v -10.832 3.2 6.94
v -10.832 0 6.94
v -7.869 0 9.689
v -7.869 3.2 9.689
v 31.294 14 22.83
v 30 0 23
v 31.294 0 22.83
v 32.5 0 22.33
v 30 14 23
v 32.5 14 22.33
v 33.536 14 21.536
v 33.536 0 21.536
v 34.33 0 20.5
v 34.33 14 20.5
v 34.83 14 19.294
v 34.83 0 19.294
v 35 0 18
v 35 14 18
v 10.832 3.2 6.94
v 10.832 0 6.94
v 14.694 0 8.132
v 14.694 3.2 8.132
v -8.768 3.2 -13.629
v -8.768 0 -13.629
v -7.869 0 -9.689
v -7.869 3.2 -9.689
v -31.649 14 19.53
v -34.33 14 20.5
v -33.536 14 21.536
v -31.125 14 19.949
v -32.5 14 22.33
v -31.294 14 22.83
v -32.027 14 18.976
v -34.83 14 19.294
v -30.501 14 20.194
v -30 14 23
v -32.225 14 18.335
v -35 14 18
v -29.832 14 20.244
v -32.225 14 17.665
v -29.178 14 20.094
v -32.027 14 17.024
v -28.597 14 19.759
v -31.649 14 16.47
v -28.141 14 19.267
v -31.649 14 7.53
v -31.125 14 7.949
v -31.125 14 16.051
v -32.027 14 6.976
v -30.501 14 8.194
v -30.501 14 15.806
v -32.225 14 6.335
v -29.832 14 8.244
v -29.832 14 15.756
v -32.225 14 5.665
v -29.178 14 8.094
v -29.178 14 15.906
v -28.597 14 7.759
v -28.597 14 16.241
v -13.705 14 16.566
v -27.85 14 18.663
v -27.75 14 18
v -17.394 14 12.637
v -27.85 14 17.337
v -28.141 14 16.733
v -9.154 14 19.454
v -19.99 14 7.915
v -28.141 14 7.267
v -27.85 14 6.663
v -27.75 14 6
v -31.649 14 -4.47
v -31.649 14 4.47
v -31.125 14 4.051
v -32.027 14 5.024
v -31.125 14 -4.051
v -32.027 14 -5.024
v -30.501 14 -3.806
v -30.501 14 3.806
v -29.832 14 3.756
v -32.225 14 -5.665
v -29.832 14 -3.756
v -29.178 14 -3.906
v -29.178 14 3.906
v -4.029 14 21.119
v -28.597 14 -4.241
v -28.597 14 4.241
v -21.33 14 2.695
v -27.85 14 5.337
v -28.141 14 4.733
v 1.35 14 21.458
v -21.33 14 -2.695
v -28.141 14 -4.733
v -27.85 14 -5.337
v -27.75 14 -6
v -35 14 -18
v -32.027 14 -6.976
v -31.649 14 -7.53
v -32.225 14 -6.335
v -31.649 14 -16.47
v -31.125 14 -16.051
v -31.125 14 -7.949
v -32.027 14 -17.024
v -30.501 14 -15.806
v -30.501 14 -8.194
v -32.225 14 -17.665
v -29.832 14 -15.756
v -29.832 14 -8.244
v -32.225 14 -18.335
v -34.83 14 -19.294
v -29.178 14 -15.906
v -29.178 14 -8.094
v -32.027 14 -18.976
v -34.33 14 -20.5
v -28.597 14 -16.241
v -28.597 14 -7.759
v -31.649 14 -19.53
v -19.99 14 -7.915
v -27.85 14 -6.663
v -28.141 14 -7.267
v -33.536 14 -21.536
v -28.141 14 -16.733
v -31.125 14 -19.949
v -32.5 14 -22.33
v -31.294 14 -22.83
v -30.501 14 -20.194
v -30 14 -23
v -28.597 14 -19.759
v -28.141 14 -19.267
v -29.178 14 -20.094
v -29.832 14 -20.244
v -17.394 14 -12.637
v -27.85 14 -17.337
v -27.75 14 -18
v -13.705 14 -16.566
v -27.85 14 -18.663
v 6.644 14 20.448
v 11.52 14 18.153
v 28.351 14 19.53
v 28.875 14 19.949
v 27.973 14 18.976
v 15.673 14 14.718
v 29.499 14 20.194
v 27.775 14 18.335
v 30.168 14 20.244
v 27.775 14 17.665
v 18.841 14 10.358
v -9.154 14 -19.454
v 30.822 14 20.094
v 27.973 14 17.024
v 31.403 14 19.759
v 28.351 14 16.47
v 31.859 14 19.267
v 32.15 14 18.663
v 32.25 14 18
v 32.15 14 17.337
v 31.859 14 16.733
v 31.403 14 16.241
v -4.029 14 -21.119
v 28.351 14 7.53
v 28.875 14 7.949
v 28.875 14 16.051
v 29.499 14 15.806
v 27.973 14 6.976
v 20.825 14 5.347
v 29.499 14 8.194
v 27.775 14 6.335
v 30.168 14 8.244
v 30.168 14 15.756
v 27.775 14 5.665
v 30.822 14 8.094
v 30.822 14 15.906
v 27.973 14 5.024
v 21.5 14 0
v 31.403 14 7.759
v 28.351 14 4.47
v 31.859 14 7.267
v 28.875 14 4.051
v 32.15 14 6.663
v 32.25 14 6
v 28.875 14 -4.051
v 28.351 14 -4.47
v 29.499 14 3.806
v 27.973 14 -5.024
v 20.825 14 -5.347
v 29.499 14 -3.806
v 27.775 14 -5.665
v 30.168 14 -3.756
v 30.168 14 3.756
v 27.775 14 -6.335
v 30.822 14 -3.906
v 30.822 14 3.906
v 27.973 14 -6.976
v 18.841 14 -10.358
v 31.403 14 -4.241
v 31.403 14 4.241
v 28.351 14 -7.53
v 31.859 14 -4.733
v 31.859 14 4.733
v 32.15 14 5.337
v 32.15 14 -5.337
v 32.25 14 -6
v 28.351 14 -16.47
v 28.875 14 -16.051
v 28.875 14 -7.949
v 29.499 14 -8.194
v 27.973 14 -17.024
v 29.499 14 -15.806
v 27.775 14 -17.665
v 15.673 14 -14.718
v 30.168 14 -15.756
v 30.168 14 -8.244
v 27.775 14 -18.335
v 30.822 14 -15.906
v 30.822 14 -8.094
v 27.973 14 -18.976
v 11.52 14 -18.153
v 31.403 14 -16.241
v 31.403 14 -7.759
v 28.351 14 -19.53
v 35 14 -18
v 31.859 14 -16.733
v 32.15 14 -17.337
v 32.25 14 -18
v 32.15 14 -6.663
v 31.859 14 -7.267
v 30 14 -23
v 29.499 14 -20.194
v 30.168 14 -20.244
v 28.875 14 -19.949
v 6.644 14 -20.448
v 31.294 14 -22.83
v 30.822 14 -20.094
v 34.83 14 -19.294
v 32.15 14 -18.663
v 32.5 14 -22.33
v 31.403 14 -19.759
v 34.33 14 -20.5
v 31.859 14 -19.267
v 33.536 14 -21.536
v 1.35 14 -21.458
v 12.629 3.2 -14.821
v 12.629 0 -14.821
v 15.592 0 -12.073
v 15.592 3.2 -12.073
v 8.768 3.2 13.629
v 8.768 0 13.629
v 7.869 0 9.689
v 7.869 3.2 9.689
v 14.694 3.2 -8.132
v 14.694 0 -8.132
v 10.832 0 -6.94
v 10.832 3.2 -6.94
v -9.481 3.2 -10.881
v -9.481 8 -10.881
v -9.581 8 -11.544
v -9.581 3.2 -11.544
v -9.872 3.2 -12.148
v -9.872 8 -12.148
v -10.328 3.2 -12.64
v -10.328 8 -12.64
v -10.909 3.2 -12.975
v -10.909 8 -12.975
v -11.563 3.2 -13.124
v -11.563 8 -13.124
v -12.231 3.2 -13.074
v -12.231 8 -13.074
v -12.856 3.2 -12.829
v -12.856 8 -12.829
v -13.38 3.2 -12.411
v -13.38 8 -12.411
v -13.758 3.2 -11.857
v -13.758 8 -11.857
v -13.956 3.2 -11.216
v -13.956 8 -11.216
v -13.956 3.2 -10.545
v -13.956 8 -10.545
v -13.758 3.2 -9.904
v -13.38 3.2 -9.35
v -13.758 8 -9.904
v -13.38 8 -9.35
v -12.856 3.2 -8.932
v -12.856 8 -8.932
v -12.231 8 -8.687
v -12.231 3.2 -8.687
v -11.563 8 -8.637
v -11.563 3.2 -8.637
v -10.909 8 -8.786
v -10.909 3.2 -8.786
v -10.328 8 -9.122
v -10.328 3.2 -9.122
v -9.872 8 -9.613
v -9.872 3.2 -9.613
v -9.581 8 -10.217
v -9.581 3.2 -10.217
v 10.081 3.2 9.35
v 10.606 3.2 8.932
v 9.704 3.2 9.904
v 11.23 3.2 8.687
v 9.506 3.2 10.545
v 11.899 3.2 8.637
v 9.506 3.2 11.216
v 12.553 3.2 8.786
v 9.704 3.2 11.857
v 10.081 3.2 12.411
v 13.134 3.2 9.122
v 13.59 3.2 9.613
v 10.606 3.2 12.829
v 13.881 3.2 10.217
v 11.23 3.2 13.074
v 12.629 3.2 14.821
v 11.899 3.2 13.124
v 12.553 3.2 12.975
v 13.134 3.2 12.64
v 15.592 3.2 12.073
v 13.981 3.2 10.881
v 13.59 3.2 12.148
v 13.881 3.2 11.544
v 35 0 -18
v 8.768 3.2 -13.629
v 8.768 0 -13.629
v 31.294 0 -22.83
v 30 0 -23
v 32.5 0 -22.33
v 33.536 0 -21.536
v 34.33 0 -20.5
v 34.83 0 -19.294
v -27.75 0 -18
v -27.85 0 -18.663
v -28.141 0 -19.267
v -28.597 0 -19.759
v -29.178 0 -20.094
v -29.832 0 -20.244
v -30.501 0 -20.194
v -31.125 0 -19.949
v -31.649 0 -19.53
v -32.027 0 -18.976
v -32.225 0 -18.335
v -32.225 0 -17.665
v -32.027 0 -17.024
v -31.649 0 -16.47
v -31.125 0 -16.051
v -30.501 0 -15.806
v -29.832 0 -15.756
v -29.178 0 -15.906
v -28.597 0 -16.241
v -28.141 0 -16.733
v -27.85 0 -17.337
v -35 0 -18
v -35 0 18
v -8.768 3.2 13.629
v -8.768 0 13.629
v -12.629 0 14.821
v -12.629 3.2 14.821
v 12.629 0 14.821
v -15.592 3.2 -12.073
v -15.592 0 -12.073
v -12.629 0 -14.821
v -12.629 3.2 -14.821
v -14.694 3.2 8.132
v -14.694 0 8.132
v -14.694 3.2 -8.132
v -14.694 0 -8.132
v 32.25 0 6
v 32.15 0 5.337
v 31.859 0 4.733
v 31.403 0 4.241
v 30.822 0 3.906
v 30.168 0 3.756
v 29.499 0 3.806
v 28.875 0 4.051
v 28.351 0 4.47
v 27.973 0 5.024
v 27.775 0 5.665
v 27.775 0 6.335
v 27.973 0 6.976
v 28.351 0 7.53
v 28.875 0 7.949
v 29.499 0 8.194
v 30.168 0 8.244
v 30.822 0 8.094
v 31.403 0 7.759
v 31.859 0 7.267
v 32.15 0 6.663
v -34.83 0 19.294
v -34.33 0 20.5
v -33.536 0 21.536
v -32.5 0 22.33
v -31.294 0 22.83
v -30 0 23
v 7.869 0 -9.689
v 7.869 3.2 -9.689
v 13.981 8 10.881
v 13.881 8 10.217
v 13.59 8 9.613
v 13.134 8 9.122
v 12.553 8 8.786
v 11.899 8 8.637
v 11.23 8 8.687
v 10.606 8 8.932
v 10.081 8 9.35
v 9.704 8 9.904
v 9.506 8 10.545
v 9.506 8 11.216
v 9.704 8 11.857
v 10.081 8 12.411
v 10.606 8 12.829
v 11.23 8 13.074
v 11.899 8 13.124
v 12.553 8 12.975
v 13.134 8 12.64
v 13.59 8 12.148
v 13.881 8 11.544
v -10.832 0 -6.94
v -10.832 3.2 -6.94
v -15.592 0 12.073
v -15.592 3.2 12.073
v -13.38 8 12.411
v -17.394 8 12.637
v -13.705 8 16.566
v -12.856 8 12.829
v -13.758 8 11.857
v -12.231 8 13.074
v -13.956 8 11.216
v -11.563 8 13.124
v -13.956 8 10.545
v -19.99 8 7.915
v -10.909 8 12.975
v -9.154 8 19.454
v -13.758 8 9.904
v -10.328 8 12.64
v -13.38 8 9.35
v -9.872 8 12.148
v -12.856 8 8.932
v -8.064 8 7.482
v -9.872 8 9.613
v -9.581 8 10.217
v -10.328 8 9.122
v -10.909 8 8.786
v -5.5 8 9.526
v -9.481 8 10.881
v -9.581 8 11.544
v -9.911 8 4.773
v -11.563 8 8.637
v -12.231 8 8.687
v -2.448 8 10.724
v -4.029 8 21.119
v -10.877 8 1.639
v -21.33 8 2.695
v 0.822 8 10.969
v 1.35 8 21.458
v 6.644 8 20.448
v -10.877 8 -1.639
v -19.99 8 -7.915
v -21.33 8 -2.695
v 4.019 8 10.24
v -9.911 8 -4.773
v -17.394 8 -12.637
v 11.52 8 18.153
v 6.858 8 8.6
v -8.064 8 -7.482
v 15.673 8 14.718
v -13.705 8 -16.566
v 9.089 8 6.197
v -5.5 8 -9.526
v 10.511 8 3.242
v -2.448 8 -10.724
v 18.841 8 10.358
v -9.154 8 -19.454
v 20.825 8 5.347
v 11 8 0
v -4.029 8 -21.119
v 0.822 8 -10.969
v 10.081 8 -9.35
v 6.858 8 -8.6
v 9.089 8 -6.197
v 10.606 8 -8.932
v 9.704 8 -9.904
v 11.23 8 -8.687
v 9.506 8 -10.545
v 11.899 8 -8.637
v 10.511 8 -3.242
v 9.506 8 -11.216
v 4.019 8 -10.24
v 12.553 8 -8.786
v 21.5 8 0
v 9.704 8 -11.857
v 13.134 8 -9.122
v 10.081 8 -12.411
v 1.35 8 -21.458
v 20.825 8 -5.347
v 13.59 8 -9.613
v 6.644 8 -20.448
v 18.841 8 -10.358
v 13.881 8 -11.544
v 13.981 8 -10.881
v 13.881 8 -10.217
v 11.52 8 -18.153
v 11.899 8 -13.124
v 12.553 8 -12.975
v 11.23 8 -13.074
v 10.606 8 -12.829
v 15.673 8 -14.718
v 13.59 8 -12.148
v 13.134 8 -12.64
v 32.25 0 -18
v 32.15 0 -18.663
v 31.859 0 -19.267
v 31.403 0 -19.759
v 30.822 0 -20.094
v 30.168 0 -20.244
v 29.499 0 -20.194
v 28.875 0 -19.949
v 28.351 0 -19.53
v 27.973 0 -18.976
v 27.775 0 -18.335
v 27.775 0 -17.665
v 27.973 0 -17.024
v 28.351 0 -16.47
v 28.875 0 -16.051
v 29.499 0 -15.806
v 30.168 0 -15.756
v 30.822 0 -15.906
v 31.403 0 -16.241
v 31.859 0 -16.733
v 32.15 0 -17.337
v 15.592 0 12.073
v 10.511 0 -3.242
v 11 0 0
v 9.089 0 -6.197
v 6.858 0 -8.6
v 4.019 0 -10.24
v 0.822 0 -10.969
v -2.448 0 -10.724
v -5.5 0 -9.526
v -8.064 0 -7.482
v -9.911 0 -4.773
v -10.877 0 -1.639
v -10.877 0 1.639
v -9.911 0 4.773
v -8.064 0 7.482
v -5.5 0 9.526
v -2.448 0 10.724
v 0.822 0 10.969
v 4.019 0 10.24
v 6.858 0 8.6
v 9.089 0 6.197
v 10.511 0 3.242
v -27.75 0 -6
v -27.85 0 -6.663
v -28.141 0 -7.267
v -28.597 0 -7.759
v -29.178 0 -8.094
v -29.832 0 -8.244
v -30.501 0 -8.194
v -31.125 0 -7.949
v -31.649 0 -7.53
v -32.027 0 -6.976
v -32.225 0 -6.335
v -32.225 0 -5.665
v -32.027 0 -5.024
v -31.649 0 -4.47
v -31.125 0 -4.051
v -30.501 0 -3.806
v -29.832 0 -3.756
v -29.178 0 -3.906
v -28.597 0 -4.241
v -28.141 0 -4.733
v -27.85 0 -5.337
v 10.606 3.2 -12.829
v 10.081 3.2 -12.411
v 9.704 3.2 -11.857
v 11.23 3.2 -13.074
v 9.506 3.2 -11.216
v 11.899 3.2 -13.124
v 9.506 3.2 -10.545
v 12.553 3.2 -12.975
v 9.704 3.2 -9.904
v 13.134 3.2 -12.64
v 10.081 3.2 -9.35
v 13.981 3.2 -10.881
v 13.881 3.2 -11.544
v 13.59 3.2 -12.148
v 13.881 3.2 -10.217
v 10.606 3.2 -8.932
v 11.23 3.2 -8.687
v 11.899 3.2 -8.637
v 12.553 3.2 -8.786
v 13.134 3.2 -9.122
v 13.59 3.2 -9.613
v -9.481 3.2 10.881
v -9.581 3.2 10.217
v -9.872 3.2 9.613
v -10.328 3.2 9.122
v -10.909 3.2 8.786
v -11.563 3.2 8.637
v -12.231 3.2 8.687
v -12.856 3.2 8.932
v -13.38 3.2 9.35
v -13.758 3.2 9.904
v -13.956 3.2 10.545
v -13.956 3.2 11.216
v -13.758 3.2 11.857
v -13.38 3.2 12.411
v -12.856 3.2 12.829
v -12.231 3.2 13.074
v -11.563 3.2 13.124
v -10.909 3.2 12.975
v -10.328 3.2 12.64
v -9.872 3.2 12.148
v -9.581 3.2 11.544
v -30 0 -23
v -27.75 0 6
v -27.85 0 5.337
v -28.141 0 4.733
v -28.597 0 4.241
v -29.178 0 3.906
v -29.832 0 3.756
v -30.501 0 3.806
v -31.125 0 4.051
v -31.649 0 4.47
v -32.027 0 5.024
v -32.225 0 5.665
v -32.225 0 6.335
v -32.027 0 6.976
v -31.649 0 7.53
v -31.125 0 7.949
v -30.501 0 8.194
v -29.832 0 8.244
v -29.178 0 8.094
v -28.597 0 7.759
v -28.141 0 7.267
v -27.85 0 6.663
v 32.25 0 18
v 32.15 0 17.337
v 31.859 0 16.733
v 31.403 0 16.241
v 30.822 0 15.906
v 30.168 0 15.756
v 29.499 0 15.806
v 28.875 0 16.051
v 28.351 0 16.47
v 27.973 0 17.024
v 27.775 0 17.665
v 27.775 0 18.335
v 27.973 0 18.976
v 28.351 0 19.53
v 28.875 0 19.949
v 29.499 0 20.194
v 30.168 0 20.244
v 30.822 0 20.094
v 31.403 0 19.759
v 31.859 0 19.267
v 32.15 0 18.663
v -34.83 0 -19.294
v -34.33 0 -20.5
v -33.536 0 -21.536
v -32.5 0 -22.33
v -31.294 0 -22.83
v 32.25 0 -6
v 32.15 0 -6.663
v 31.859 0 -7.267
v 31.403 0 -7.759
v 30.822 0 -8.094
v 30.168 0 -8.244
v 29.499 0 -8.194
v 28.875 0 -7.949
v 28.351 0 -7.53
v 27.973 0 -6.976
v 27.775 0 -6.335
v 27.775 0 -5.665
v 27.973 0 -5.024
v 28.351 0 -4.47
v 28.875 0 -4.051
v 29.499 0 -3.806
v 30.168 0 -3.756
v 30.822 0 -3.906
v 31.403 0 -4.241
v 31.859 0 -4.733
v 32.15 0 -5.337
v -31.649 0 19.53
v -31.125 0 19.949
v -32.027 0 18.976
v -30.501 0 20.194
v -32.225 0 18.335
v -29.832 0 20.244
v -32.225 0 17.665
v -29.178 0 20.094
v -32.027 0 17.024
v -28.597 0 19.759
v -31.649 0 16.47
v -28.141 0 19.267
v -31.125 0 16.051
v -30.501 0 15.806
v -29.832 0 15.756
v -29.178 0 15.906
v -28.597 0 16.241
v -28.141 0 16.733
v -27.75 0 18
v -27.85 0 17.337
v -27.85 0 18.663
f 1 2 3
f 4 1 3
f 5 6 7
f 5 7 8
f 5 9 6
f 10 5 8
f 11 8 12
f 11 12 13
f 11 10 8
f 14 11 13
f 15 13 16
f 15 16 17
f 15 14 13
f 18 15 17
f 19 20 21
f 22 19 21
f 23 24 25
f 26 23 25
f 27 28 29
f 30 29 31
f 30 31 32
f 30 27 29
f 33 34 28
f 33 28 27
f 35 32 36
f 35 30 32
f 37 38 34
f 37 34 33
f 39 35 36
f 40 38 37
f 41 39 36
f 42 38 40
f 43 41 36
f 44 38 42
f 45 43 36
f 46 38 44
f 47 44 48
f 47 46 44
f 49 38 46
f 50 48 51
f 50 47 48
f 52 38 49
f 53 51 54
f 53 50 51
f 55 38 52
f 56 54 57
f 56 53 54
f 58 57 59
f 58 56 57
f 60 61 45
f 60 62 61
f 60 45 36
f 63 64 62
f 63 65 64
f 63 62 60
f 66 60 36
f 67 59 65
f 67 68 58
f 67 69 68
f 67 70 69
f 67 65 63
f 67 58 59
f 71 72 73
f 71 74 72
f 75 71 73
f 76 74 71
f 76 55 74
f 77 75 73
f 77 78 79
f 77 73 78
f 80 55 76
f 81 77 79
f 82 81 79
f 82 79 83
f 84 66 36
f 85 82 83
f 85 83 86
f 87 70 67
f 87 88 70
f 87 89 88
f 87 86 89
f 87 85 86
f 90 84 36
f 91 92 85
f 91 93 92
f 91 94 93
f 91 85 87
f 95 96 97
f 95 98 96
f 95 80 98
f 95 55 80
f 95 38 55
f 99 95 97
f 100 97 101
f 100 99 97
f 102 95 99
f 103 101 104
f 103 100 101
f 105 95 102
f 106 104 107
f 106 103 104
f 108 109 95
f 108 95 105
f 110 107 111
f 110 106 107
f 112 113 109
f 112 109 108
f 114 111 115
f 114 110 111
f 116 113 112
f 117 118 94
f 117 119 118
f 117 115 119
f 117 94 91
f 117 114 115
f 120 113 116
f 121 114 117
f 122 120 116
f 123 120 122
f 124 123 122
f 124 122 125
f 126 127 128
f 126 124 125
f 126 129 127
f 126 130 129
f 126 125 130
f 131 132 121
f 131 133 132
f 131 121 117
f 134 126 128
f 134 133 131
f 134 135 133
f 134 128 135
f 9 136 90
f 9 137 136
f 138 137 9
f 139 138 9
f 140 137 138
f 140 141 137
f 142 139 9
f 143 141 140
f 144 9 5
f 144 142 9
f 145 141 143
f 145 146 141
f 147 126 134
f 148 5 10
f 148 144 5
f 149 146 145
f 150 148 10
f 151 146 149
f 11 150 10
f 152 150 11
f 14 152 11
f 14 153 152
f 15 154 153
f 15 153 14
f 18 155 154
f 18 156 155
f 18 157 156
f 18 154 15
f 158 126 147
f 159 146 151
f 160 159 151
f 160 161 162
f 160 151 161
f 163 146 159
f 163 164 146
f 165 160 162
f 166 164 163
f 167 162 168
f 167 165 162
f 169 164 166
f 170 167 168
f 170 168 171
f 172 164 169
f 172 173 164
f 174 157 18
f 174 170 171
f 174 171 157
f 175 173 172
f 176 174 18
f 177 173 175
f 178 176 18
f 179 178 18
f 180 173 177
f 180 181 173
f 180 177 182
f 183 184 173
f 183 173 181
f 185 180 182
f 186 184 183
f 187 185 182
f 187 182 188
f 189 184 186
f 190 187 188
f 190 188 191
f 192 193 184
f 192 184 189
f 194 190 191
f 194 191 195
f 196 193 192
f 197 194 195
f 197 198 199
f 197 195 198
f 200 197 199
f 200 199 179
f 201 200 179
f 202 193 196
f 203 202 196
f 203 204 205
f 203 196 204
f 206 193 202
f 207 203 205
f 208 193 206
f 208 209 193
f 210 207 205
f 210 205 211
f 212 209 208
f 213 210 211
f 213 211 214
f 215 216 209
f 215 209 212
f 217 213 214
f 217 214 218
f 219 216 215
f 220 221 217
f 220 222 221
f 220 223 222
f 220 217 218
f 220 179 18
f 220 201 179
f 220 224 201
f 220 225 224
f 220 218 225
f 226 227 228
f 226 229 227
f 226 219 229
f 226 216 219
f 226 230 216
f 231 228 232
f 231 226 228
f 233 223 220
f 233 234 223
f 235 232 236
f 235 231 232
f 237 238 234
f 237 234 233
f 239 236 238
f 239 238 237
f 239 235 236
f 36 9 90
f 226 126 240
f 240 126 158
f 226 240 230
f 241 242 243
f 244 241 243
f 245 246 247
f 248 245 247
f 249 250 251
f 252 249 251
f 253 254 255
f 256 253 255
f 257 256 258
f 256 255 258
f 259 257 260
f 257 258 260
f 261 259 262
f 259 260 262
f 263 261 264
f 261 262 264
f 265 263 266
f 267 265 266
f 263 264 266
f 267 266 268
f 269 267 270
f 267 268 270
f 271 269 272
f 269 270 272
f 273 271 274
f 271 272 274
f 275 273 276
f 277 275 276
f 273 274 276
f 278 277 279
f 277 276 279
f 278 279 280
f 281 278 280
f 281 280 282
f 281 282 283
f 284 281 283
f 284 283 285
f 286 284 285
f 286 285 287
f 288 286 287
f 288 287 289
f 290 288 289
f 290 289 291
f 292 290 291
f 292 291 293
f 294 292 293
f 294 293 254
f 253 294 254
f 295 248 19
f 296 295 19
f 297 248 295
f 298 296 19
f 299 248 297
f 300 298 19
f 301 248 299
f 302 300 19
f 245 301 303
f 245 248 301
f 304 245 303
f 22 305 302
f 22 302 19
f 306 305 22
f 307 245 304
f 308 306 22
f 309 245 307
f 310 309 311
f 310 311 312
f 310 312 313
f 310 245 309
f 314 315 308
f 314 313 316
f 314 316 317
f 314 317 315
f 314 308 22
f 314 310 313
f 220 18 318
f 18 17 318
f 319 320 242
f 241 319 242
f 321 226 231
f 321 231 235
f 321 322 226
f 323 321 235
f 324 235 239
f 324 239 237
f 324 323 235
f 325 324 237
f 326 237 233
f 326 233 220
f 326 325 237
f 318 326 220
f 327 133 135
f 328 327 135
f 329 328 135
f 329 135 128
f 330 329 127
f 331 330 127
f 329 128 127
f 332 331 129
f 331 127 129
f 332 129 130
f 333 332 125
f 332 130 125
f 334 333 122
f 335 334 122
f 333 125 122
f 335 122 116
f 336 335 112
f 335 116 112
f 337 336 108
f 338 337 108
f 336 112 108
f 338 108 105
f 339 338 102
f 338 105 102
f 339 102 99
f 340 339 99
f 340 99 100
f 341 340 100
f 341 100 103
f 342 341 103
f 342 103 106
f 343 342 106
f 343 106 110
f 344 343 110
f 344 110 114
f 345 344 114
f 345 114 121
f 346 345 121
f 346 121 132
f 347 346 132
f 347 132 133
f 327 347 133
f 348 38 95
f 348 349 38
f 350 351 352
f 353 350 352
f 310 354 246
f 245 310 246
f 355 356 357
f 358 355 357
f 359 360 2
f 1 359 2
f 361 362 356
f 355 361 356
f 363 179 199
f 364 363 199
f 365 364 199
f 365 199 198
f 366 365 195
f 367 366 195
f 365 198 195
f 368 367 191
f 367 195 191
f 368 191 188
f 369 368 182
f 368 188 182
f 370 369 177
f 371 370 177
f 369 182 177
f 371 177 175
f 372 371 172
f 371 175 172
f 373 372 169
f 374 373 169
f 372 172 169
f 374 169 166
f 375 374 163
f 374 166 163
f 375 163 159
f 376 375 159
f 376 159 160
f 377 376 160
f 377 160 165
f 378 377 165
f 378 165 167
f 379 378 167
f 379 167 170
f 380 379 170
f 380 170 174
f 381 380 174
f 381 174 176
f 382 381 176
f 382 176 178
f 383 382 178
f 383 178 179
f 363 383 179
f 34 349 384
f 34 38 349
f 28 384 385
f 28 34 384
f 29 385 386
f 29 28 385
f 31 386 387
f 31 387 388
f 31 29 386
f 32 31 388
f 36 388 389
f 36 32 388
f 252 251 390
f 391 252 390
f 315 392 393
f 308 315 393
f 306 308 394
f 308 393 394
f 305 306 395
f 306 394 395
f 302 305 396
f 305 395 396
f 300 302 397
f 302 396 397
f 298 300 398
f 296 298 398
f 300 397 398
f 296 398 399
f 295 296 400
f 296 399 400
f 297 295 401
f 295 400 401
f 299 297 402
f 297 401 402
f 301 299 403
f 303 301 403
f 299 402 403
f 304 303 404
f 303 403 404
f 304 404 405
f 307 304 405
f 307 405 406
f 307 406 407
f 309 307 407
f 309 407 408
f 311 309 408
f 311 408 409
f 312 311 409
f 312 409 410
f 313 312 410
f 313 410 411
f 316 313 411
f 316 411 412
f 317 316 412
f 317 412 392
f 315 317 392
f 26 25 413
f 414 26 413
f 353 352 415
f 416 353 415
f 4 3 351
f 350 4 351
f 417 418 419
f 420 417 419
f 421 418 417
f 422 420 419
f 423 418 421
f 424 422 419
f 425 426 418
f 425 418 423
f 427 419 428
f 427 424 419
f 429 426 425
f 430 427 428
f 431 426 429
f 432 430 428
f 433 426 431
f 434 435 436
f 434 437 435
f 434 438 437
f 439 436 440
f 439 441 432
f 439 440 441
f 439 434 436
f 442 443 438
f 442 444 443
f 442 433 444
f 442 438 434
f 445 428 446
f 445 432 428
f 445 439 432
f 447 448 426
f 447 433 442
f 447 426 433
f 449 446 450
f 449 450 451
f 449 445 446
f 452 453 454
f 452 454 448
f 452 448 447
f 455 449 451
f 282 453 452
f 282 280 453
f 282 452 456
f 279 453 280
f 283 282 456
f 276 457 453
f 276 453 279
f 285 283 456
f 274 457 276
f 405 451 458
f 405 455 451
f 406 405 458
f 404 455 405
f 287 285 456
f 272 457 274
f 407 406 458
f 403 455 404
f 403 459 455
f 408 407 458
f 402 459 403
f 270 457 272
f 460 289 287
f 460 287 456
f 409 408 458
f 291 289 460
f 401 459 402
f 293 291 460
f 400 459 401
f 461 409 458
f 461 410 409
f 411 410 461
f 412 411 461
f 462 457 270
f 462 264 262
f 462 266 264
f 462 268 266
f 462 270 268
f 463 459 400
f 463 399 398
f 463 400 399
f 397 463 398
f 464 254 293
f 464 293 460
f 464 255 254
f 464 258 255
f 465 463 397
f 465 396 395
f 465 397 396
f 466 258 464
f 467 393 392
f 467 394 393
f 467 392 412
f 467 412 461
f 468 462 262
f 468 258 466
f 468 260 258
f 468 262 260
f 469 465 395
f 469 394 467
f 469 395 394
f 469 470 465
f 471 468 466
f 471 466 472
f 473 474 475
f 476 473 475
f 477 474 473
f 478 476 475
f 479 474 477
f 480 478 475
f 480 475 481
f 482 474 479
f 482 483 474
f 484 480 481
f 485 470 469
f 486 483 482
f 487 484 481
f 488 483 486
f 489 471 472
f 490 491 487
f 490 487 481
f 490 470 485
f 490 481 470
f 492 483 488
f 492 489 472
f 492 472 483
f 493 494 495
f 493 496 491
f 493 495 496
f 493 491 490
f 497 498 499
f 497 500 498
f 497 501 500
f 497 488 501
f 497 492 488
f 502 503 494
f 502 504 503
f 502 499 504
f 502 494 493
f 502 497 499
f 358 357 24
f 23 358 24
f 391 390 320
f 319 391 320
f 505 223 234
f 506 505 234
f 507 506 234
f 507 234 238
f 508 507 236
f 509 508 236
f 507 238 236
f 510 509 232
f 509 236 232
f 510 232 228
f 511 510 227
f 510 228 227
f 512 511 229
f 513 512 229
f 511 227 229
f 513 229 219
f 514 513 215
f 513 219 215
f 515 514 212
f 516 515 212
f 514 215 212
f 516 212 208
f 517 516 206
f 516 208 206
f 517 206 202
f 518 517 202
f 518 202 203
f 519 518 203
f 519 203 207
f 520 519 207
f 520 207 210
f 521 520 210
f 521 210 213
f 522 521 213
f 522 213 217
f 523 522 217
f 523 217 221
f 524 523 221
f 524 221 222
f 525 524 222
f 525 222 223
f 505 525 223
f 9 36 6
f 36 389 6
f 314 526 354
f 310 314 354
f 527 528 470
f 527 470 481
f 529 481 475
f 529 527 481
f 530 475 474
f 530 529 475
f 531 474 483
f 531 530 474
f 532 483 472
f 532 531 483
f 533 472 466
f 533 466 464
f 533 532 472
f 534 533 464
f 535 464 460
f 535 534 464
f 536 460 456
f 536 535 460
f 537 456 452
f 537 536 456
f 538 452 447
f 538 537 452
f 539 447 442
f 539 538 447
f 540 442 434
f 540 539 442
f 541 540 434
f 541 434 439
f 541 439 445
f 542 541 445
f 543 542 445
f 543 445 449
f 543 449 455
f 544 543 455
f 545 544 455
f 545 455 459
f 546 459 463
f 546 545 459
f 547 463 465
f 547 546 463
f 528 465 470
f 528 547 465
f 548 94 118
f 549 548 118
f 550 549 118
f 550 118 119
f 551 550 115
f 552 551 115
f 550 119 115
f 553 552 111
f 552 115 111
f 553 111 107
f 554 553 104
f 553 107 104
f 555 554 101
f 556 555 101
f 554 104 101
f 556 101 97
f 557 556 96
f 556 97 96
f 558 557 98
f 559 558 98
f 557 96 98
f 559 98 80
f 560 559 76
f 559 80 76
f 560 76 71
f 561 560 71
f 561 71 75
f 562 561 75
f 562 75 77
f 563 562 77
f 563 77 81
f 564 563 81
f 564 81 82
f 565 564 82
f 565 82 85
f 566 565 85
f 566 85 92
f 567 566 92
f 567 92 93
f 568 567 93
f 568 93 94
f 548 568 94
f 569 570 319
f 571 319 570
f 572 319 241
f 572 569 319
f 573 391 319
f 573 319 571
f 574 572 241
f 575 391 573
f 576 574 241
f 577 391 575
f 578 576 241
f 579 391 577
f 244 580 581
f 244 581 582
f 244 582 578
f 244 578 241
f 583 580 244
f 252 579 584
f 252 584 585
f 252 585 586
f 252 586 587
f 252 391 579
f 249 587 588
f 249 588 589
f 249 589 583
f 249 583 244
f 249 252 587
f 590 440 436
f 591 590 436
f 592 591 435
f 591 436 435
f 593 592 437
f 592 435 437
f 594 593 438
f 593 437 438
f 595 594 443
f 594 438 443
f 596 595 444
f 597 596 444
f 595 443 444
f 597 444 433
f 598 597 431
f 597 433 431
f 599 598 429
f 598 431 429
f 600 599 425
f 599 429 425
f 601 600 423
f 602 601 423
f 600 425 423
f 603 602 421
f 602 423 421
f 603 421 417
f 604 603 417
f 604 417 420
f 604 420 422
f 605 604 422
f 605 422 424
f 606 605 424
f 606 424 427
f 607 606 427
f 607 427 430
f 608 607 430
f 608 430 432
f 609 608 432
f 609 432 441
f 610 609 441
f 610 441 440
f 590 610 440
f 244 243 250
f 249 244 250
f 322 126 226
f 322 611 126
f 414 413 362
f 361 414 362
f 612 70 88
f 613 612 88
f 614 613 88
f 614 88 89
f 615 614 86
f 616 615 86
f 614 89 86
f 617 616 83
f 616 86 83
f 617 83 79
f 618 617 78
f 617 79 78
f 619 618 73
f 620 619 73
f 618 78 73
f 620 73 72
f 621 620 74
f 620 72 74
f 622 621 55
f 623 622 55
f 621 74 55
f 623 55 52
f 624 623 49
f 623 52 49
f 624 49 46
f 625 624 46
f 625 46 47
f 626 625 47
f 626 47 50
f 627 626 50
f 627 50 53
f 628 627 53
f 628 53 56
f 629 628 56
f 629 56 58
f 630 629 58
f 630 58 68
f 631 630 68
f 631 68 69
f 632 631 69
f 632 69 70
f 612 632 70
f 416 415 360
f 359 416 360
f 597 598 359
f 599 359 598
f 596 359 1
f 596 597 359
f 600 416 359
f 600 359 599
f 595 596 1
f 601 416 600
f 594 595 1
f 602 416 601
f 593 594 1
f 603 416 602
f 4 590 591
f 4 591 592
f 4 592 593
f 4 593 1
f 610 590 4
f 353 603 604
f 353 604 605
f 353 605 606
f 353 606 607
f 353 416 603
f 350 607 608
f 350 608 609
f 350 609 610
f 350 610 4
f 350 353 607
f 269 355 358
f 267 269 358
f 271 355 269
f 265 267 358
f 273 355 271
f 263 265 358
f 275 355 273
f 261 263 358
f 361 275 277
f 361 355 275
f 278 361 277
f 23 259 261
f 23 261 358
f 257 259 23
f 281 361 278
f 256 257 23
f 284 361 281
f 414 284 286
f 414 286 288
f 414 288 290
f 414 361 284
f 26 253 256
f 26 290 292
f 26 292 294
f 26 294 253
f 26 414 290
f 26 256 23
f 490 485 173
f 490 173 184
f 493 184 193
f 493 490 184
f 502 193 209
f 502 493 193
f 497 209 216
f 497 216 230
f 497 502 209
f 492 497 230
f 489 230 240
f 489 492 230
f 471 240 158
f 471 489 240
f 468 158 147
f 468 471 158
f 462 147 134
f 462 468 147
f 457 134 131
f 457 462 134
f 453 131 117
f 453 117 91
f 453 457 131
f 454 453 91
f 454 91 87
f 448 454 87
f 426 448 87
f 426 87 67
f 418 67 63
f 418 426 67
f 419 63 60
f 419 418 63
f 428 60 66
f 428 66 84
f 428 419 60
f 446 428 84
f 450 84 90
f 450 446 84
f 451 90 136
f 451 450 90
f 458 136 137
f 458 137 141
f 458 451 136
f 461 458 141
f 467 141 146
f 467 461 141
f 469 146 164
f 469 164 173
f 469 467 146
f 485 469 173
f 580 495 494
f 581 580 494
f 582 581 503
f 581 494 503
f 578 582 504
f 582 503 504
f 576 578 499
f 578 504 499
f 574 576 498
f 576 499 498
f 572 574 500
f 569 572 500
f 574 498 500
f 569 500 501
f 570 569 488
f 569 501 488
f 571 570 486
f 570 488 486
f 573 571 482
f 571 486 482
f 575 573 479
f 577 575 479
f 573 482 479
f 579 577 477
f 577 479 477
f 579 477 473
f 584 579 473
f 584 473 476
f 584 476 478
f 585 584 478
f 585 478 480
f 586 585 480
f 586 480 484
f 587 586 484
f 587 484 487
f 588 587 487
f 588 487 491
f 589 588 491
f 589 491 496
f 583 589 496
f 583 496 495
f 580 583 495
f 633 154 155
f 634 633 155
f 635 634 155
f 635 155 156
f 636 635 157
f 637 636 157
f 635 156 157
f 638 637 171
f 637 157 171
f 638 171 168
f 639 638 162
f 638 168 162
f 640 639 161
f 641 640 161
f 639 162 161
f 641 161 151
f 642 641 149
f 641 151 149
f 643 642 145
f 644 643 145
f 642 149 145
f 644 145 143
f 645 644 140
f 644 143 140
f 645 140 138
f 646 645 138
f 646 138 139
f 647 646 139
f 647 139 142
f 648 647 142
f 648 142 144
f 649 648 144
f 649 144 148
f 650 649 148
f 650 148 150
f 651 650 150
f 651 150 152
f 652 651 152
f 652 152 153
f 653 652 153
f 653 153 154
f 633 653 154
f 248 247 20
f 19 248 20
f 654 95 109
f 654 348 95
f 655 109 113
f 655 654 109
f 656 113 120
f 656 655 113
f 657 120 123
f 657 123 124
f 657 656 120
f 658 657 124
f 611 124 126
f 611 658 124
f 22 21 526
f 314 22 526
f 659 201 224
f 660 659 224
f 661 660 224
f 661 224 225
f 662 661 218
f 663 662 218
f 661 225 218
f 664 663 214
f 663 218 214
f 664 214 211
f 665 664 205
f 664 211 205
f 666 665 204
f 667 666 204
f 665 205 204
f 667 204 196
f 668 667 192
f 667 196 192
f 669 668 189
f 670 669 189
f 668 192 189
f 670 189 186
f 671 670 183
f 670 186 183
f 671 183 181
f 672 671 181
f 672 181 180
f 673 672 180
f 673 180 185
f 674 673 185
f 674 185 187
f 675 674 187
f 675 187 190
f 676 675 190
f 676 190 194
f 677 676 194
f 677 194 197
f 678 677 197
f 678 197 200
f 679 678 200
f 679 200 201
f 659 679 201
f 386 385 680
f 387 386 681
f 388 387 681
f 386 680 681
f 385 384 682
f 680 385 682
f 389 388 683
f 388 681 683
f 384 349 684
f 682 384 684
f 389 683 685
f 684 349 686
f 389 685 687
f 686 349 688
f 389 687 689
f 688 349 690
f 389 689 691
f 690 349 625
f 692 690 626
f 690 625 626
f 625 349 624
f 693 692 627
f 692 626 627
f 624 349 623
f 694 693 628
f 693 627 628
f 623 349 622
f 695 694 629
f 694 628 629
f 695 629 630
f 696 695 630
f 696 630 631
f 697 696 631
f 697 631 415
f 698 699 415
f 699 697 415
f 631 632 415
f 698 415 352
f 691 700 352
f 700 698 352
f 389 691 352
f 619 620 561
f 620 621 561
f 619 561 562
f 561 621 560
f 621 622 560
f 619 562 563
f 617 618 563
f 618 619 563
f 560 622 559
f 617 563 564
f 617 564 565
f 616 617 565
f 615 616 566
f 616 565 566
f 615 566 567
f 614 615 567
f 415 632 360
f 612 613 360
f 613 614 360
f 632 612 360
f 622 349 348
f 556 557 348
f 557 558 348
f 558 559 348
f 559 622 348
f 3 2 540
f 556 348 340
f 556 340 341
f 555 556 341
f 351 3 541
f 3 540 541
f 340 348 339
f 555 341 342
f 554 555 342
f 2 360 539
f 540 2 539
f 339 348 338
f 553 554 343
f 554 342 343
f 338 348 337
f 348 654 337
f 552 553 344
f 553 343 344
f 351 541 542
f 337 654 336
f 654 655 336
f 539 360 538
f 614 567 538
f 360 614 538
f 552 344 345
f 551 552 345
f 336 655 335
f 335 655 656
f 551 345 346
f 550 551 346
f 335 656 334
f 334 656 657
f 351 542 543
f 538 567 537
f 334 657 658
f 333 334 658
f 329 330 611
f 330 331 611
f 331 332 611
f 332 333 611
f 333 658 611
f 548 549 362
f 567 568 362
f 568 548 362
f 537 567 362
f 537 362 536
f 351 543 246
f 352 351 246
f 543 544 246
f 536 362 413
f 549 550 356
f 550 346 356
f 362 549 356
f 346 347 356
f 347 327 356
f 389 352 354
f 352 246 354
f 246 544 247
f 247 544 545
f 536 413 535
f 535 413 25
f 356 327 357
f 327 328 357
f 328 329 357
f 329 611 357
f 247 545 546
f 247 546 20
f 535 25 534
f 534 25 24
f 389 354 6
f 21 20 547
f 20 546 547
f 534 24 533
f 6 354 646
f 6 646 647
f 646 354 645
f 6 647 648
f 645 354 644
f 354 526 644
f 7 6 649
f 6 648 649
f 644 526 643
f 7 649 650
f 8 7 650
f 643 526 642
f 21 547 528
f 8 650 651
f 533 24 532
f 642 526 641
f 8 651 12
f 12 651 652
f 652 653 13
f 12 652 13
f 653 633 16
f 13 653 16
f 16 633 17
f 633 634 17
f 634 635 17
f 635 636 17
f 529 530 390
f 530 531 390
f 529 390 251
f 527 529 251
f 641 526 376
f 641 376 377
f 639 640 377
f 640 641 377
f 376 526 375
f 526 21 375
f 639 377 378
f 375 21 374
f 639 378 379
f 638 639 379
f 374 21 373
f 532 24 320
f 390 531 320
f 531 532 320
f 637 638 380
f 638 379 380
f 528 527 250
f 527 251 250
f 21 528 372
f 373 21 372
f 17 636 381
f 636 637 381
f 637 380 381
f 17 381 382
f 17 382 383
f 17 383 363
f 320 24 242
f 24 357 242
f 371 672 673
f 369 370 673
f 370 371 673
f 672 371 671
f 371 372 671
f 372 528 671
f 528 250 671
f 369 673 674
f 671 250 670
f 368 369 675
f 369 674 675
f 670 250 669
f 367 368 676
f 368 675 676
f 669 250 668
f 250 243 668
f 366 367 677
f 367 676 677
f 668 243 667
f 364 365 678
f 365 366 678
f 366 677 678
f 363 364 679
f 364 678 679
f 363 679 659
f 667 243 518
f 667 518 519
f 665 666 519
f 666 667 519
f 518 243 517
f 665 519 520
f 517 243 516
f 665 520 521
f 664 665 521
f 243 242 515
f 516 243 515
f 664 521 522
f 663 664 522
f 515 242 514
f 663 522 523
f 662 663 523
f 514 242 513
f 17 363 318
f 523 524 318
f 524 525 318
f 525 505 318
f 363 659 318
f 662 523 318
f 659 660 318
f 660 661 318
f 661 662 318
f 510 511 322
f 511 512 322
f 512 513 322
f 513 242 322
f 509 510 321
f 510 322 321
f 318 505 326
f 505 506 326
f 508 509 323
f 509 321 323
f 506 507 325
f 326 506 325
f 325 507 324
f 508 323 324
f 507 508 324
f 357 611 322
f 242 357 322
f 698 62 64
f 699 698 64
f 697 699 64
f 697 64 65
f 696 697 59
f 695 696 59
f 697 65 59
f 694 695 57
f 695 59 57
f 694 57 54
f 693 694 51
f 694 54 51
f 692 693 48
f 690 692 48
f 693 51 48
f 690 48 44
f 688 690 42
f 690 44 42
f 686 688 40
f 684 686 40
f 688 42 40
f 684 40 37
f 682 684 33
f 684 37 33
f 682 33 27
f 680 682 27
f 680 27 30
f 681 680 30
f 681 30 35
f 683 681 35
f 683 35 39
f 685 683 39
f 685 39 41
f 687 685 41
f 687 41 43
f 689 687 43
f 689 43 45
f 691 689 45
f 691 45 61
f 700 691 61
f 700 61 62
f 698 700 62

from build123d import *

# Parameters (mm, degrees)
SKETCH1_W           = 70
SKETCH1_H           = 46
SKETCH1_R           = 11
BOSS_EXTRUDE1_DEPTH = 8
SKETCH2_W           = 70
SKETCH2_H           = 46
SKETCH2_R           = 21.5
BOSS_EXTRUDE2_DEPTH = 6
SKETCH3_R           = 2.25
CUT_EXTRUDE1_DEPTH  = 9
CUT_EXTRUDE2_DEPTH  = 3.2
FILLET1_R           = 5
SKETCH6_R           = 2.25
CUT_EXTRUDE3_DEPTH  = 15


with BuildPart() as part:
    # Sketch1 → Boss-Extrude1 (new body)
    with BuildSketch(Plane(origin=(0, 0, 0), x_dir=(1, 0, 0), z_dir=(0, 1, 0))):
        Rectangle(SKETCH1_W, SKETCH1_H)
        Circle(SKETCH1_R, mode=Mode.SUBTRACT)
    extrude(amount=BOSS_EXTRUDE1_DEPTH)

    # Sketch2 → Boss-Extrude2 (add)
    with BuildSketch(Plane(origin=(0, 8, 0), x_dir=(1, 0, 0), z_dir=(0, 1, 0))):
        Rectangle(SKETCH2_W, SKETCH2_H)
        Circle(SKETCH2_R, mode=Mode.SUBTRACT)
    extrude(amount=BOSS_EXTRUDE2_DEPTH)

    # Sketch3 → Cut-Extrude1 (cut, through all)
    with BuildSketch(Plane(origin=(0, 8, 0), x_dir=(1, 0, 0), z_dir=(0, 1, 0))):
        with Locations((-11.730749234, 10.880694942)):
            Circle(SKETCH3_R)
        with Locations((11.730749234, 10.880694942)):
            Circle(SKETCH3_R)
        with Locations((11.730749234, -10.880694942)):
            Circle(SKETCH3_R)
        with Locations((-11.730749234, -10.880694942)):
            Circle(SKETCH3_R)
    extrude(amount=-CUT_EXTRUDE1_DEPTH, mode=Mode.SUBTRACT)

    # Sketch5 → Cut-Extrude2 (cut)
    with BuildSketch(Plane.XZ):
        Polygon((-12.629361921, 14.820977745), (-15.592440583, 12.072614928), (-14.693827896, 8.132332124), (-10.832136547, 6.940412138), (-7.869057884, 9.688774955), (-8.767670572, 13.629057759), align=None)
        Polygon((-10.832136547, -6.940412138), (-14.693827896, -8.132332124), (-15.592440583, -12.072614928), (-12.629361921, -14.820977745), (-8.767670572, -13.629057759), (-7.869057884, -9.688774955), align=None)
        Polygon((10.832136547, -6.940412138), (7.869057884, -9.688774955), (8.767670572, -13.629057759), (12.629361921, -14.820977745), (15.592440583, -12.072614928), (14.693827896, -8.132332124), align=None)
        Polygon((7.869057884, 9.688774955), (10.832136547, 6.940412138), (14.693827896, 8.132332124), (15.592440583, 12.072614928), (12.629361921, 14.820977745), (8.767670572, 13.629057759), align=None)
    extrude(amount=-CUT_EXTRUDE2_DEPTH, mode=Mode.SUBTRACT)

    # Fillet1
    fillet1_edges = [part.edges().sort_by_distance(p)[0] for p in [
        (35, 7, 23),
        (-35, 7, 23),
        (-35, 7, -23),
        (35, 7, -23),
    ]]
    fillet(fillet1_edges, radius=FILLET1_R)

    # Sketch6 → Cut-Extrude3 (cut, through all)
    with BuildSketch(Plane(origin=(0, 14, 0), x_dir=(1, 0, 0), z_dir=(0, 1, 0))):
        with Locations((-30, 18)):
            Circle(SKETCH6_R)
        with Locations((-30, -18)):
            Circle(SKETCH6_R)
        with Locations((30, -18)):
            Circle(SKETCH6_R)
        with Locations((30, 18)):
            Circle(SKETCH6_R)
        with Locations((-30, 6)):
            Circle(SKETCH6_R)
        with Locations((-30, -6)):
            Circle(SKETCH6_R)
        with Locations((30, -6)):
            Circle(SKETCH6_R)
        with Locations((30, 6)):
            Circle(SKETCH6_R)
    extrude(amount=-CUT_EXTRUDE3_DEPTH, mode=Mode.SUBTRACT)


solid = part.part
